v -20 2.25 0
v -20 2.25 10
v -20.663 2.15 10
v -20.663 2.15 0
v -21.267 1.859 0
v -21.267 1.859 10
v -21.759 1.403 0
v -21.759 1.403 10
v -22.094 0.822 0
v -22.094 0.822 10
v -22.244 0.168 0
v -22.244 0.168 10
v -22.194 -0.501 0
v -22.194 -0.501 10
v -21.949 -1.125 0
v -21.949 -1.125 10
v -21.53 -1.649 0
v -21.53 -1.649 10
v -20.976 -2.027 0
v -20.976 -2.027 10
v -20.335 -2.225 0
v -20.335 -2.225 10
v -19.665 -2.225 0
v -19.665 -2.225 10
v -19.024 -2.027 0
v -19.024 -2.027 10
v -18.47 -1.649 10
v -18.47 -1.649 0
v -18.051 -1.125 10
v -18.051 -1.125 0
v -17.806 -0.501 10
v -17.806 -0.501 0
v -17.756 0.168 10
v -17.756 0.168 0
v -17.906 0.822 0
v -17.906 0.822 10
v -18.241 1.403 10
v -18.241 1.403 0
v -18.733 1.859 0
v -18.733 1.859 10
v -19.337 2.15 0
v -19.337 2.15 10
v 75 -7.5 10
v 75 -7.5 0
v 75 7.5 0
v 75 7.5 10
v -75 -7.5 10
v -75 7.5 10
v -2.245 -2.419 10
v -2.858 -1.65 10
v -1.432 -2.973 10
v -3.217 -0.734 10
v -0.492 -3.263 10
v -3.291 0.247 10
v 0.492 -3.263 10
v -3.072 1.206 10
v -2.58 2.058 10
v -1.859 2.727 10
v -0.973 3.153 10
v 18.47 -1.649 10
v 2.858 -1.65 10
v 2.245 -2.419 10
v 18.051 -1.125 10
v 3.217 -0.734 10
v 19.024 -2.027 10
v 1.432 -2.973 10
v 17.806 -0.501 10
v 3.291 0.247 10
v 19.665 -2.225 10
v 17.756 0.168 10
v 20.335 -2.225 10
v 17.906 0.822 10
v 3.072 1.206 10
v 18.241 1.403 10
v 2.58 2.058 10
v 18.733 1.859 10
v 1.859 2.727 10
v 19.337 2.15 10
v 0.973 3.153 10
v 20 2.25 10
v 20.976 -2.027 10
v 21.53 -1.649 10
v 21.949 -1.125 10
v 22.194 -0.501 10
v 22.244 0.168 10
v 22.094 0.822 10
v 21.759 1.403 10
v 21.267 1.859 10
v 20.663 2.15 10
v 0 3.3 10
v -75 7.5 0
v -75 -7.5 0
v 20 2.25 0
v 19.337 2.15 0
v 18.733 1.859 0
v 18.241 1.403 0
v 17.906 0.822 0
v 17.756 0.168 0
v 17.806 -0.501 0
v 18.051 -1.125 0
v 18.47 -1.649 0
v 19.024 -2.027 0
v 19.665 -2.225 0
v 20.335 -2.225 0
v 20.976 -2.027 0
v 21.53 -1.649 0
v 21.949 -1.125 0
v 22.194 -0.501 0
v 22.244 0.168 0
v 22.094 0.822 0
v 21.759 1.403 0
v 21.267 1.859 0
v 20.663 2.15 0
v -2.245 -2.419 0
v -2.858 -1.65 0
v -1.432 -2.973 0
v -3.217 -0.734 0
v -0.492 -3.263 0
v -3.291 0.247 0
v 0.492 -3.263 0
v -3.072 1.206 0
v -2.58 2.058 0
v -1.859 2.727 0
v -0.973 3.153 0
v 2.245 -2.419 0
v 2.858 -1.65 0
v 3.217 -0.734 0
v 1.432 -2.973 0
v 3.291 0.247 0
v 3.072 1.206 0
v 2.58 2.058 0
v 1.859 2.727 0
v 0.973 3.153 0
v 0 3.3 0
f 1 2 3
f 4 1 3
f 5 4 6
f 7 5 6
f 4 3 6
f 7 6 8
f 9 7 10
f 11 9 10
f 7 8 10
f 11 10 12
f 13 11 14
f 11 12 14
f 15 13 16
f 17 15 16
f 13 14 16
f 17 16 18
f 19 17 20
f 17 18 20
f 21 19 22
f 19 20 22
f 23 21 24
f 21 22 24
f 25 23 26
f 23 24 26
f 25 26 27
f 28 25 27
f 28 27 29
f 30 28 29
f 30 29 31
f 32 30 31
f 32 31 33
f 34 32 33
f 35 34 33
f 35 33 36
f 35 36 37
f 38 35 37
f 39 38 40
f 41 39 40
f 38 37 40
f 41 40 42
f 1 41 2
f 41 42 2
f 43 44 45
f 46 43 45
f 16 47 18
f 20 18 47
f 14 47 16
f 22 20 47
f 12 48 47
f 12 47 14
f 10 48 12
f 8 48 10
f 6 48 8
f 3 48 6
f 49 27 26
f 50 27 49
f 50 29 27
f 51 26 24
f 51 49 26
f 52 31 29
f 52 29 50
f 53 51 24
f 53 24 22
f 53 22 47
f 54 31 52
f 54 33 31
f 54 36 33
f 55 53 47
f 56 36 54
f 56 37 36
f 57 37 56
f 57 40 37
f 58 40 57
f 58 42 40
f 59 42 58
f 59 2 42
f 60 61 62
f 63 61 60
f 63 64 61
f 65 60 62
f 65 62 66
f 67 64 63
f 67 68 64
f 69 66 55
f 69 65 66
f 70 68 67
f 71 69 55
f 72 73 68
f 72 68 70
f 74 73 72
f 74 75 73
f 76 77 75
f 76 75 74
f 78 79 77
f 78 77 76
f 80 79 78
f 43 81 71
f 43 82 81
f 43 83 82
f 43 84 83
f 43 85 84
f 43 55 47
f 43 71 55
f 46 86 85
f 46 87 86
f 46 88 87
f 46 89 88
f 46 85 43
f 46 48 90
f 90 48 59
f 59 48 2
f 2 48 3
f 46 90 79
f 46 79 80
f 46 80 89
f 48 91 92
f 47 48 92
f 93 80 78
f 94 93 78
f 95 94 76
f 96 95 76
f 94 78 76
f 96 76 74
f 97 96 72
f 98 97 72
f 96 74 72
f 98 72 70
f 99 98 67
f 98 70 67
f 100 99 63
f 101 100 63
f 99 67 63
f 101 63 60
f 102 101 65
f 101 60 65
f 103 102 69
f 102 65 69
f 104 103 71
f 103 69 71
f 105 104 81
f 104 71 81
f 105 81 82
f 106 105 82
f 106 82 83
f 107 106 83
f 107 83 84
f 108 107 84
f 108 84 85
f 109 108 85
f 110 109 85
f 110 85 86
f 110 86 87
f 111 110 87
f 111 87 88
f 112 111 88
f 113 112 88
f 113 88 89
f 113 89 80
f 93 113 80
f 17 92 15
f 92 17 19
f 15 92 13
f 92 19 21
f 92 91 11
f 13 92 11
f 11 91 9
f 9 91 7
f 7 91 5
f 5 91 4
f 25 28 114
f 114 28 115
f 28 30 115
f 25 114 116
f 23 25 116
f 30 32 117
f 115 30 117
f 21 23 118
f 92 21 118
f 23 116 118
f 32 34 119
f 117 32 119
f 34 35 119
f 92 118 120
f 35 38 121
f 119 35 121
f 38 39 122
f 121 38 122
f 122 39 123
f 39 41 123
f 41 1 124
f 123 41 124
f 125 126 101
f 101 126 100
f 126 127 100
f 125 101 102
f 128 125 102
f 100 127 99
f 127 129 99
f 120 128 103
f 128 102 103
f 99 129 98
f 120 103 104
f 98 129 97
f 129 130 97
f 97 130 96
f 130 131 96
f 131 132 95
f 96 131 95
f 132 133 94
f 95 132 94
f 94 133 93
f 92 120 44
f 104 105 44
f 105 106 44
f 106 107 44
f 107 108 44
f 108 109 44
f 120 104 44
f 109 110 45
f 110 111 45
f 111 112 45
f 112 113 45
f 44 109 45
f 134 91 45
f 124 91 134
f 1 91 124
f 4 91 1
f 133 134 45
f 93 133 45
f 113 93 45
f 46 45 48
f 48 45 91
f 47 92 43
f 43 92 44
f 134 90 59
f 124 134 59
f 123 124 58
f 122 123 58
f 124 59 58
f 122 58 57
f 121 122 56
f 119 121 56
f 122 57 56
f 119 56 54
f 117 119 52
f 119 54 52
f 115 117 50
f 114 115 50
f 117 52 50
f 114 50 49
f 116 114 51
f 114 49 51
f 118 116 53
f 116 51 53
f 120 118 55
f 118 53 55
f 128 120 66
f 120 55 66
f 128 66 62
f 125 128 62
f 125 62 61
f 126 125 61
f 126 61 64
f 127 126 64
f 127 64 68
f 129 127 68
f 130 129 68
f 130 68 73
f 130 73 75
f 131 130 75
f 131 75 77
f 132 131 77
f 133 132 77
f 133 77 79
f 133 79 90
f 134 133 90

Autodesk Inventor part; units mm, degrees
ref_plane "YZ Plane" through (0, 0, 0) normal (1, 0, 0) x (0, 1, 0)
ref_plane "XZ Plane" through (0, 0, 0) normal (0, 1, 0) x (-1, 0, 0)
ref_plane "XY Plane" through (0, 0, 0) normal (0, 0, 1) x (1, 0, 0)
sketch "Skizze1" plane through (0, 0, 0) normal (0, 0, 1) x (1, 0, 0)
  line L0 (75, 7.5) -> (-75, 7.5)
  line L1 (-75, 7.5) -> (-75, -7.5)
  line L2 (-75, -7.5) -> (75, -7.5)
  line L3 (75, -7.5) -> (75, 7.5)
  line L4 (75, 7.5) -> (-75, -7.5) construction
  line L5 (-75, 7.5) -> (75, -7.5) construction
  line L6 (-20, 0) -> (20, 0) construction
  point P0 (0, 0)
  point P1 (0, 0)
  point P2 (0, 0)
  dimension "d0" = 40
  dimension "d1" = 15
  dimension "d2" = 150
extrude "Extrusion1" add sketch "Skizze1" along normal blind 10
hole "Bohrung1" at (-20, 0, 0) at (20, 0, 0) direction (0, 0, 1) diameter 4.5 end through all clearance for "Inbusschraube DIN EN ISO 4762" size "M4" standard "DIN"
hole "Bohrung2" at (0, 0, 0) direction (0, 0, 1) diameter 6.6 end through all clearance for "Sechskantkopfschraube DIN EN 24017" size "M6" standard "DIN"
properties part number "ParallelMecha_V2_BaseFormation_Proximal"
